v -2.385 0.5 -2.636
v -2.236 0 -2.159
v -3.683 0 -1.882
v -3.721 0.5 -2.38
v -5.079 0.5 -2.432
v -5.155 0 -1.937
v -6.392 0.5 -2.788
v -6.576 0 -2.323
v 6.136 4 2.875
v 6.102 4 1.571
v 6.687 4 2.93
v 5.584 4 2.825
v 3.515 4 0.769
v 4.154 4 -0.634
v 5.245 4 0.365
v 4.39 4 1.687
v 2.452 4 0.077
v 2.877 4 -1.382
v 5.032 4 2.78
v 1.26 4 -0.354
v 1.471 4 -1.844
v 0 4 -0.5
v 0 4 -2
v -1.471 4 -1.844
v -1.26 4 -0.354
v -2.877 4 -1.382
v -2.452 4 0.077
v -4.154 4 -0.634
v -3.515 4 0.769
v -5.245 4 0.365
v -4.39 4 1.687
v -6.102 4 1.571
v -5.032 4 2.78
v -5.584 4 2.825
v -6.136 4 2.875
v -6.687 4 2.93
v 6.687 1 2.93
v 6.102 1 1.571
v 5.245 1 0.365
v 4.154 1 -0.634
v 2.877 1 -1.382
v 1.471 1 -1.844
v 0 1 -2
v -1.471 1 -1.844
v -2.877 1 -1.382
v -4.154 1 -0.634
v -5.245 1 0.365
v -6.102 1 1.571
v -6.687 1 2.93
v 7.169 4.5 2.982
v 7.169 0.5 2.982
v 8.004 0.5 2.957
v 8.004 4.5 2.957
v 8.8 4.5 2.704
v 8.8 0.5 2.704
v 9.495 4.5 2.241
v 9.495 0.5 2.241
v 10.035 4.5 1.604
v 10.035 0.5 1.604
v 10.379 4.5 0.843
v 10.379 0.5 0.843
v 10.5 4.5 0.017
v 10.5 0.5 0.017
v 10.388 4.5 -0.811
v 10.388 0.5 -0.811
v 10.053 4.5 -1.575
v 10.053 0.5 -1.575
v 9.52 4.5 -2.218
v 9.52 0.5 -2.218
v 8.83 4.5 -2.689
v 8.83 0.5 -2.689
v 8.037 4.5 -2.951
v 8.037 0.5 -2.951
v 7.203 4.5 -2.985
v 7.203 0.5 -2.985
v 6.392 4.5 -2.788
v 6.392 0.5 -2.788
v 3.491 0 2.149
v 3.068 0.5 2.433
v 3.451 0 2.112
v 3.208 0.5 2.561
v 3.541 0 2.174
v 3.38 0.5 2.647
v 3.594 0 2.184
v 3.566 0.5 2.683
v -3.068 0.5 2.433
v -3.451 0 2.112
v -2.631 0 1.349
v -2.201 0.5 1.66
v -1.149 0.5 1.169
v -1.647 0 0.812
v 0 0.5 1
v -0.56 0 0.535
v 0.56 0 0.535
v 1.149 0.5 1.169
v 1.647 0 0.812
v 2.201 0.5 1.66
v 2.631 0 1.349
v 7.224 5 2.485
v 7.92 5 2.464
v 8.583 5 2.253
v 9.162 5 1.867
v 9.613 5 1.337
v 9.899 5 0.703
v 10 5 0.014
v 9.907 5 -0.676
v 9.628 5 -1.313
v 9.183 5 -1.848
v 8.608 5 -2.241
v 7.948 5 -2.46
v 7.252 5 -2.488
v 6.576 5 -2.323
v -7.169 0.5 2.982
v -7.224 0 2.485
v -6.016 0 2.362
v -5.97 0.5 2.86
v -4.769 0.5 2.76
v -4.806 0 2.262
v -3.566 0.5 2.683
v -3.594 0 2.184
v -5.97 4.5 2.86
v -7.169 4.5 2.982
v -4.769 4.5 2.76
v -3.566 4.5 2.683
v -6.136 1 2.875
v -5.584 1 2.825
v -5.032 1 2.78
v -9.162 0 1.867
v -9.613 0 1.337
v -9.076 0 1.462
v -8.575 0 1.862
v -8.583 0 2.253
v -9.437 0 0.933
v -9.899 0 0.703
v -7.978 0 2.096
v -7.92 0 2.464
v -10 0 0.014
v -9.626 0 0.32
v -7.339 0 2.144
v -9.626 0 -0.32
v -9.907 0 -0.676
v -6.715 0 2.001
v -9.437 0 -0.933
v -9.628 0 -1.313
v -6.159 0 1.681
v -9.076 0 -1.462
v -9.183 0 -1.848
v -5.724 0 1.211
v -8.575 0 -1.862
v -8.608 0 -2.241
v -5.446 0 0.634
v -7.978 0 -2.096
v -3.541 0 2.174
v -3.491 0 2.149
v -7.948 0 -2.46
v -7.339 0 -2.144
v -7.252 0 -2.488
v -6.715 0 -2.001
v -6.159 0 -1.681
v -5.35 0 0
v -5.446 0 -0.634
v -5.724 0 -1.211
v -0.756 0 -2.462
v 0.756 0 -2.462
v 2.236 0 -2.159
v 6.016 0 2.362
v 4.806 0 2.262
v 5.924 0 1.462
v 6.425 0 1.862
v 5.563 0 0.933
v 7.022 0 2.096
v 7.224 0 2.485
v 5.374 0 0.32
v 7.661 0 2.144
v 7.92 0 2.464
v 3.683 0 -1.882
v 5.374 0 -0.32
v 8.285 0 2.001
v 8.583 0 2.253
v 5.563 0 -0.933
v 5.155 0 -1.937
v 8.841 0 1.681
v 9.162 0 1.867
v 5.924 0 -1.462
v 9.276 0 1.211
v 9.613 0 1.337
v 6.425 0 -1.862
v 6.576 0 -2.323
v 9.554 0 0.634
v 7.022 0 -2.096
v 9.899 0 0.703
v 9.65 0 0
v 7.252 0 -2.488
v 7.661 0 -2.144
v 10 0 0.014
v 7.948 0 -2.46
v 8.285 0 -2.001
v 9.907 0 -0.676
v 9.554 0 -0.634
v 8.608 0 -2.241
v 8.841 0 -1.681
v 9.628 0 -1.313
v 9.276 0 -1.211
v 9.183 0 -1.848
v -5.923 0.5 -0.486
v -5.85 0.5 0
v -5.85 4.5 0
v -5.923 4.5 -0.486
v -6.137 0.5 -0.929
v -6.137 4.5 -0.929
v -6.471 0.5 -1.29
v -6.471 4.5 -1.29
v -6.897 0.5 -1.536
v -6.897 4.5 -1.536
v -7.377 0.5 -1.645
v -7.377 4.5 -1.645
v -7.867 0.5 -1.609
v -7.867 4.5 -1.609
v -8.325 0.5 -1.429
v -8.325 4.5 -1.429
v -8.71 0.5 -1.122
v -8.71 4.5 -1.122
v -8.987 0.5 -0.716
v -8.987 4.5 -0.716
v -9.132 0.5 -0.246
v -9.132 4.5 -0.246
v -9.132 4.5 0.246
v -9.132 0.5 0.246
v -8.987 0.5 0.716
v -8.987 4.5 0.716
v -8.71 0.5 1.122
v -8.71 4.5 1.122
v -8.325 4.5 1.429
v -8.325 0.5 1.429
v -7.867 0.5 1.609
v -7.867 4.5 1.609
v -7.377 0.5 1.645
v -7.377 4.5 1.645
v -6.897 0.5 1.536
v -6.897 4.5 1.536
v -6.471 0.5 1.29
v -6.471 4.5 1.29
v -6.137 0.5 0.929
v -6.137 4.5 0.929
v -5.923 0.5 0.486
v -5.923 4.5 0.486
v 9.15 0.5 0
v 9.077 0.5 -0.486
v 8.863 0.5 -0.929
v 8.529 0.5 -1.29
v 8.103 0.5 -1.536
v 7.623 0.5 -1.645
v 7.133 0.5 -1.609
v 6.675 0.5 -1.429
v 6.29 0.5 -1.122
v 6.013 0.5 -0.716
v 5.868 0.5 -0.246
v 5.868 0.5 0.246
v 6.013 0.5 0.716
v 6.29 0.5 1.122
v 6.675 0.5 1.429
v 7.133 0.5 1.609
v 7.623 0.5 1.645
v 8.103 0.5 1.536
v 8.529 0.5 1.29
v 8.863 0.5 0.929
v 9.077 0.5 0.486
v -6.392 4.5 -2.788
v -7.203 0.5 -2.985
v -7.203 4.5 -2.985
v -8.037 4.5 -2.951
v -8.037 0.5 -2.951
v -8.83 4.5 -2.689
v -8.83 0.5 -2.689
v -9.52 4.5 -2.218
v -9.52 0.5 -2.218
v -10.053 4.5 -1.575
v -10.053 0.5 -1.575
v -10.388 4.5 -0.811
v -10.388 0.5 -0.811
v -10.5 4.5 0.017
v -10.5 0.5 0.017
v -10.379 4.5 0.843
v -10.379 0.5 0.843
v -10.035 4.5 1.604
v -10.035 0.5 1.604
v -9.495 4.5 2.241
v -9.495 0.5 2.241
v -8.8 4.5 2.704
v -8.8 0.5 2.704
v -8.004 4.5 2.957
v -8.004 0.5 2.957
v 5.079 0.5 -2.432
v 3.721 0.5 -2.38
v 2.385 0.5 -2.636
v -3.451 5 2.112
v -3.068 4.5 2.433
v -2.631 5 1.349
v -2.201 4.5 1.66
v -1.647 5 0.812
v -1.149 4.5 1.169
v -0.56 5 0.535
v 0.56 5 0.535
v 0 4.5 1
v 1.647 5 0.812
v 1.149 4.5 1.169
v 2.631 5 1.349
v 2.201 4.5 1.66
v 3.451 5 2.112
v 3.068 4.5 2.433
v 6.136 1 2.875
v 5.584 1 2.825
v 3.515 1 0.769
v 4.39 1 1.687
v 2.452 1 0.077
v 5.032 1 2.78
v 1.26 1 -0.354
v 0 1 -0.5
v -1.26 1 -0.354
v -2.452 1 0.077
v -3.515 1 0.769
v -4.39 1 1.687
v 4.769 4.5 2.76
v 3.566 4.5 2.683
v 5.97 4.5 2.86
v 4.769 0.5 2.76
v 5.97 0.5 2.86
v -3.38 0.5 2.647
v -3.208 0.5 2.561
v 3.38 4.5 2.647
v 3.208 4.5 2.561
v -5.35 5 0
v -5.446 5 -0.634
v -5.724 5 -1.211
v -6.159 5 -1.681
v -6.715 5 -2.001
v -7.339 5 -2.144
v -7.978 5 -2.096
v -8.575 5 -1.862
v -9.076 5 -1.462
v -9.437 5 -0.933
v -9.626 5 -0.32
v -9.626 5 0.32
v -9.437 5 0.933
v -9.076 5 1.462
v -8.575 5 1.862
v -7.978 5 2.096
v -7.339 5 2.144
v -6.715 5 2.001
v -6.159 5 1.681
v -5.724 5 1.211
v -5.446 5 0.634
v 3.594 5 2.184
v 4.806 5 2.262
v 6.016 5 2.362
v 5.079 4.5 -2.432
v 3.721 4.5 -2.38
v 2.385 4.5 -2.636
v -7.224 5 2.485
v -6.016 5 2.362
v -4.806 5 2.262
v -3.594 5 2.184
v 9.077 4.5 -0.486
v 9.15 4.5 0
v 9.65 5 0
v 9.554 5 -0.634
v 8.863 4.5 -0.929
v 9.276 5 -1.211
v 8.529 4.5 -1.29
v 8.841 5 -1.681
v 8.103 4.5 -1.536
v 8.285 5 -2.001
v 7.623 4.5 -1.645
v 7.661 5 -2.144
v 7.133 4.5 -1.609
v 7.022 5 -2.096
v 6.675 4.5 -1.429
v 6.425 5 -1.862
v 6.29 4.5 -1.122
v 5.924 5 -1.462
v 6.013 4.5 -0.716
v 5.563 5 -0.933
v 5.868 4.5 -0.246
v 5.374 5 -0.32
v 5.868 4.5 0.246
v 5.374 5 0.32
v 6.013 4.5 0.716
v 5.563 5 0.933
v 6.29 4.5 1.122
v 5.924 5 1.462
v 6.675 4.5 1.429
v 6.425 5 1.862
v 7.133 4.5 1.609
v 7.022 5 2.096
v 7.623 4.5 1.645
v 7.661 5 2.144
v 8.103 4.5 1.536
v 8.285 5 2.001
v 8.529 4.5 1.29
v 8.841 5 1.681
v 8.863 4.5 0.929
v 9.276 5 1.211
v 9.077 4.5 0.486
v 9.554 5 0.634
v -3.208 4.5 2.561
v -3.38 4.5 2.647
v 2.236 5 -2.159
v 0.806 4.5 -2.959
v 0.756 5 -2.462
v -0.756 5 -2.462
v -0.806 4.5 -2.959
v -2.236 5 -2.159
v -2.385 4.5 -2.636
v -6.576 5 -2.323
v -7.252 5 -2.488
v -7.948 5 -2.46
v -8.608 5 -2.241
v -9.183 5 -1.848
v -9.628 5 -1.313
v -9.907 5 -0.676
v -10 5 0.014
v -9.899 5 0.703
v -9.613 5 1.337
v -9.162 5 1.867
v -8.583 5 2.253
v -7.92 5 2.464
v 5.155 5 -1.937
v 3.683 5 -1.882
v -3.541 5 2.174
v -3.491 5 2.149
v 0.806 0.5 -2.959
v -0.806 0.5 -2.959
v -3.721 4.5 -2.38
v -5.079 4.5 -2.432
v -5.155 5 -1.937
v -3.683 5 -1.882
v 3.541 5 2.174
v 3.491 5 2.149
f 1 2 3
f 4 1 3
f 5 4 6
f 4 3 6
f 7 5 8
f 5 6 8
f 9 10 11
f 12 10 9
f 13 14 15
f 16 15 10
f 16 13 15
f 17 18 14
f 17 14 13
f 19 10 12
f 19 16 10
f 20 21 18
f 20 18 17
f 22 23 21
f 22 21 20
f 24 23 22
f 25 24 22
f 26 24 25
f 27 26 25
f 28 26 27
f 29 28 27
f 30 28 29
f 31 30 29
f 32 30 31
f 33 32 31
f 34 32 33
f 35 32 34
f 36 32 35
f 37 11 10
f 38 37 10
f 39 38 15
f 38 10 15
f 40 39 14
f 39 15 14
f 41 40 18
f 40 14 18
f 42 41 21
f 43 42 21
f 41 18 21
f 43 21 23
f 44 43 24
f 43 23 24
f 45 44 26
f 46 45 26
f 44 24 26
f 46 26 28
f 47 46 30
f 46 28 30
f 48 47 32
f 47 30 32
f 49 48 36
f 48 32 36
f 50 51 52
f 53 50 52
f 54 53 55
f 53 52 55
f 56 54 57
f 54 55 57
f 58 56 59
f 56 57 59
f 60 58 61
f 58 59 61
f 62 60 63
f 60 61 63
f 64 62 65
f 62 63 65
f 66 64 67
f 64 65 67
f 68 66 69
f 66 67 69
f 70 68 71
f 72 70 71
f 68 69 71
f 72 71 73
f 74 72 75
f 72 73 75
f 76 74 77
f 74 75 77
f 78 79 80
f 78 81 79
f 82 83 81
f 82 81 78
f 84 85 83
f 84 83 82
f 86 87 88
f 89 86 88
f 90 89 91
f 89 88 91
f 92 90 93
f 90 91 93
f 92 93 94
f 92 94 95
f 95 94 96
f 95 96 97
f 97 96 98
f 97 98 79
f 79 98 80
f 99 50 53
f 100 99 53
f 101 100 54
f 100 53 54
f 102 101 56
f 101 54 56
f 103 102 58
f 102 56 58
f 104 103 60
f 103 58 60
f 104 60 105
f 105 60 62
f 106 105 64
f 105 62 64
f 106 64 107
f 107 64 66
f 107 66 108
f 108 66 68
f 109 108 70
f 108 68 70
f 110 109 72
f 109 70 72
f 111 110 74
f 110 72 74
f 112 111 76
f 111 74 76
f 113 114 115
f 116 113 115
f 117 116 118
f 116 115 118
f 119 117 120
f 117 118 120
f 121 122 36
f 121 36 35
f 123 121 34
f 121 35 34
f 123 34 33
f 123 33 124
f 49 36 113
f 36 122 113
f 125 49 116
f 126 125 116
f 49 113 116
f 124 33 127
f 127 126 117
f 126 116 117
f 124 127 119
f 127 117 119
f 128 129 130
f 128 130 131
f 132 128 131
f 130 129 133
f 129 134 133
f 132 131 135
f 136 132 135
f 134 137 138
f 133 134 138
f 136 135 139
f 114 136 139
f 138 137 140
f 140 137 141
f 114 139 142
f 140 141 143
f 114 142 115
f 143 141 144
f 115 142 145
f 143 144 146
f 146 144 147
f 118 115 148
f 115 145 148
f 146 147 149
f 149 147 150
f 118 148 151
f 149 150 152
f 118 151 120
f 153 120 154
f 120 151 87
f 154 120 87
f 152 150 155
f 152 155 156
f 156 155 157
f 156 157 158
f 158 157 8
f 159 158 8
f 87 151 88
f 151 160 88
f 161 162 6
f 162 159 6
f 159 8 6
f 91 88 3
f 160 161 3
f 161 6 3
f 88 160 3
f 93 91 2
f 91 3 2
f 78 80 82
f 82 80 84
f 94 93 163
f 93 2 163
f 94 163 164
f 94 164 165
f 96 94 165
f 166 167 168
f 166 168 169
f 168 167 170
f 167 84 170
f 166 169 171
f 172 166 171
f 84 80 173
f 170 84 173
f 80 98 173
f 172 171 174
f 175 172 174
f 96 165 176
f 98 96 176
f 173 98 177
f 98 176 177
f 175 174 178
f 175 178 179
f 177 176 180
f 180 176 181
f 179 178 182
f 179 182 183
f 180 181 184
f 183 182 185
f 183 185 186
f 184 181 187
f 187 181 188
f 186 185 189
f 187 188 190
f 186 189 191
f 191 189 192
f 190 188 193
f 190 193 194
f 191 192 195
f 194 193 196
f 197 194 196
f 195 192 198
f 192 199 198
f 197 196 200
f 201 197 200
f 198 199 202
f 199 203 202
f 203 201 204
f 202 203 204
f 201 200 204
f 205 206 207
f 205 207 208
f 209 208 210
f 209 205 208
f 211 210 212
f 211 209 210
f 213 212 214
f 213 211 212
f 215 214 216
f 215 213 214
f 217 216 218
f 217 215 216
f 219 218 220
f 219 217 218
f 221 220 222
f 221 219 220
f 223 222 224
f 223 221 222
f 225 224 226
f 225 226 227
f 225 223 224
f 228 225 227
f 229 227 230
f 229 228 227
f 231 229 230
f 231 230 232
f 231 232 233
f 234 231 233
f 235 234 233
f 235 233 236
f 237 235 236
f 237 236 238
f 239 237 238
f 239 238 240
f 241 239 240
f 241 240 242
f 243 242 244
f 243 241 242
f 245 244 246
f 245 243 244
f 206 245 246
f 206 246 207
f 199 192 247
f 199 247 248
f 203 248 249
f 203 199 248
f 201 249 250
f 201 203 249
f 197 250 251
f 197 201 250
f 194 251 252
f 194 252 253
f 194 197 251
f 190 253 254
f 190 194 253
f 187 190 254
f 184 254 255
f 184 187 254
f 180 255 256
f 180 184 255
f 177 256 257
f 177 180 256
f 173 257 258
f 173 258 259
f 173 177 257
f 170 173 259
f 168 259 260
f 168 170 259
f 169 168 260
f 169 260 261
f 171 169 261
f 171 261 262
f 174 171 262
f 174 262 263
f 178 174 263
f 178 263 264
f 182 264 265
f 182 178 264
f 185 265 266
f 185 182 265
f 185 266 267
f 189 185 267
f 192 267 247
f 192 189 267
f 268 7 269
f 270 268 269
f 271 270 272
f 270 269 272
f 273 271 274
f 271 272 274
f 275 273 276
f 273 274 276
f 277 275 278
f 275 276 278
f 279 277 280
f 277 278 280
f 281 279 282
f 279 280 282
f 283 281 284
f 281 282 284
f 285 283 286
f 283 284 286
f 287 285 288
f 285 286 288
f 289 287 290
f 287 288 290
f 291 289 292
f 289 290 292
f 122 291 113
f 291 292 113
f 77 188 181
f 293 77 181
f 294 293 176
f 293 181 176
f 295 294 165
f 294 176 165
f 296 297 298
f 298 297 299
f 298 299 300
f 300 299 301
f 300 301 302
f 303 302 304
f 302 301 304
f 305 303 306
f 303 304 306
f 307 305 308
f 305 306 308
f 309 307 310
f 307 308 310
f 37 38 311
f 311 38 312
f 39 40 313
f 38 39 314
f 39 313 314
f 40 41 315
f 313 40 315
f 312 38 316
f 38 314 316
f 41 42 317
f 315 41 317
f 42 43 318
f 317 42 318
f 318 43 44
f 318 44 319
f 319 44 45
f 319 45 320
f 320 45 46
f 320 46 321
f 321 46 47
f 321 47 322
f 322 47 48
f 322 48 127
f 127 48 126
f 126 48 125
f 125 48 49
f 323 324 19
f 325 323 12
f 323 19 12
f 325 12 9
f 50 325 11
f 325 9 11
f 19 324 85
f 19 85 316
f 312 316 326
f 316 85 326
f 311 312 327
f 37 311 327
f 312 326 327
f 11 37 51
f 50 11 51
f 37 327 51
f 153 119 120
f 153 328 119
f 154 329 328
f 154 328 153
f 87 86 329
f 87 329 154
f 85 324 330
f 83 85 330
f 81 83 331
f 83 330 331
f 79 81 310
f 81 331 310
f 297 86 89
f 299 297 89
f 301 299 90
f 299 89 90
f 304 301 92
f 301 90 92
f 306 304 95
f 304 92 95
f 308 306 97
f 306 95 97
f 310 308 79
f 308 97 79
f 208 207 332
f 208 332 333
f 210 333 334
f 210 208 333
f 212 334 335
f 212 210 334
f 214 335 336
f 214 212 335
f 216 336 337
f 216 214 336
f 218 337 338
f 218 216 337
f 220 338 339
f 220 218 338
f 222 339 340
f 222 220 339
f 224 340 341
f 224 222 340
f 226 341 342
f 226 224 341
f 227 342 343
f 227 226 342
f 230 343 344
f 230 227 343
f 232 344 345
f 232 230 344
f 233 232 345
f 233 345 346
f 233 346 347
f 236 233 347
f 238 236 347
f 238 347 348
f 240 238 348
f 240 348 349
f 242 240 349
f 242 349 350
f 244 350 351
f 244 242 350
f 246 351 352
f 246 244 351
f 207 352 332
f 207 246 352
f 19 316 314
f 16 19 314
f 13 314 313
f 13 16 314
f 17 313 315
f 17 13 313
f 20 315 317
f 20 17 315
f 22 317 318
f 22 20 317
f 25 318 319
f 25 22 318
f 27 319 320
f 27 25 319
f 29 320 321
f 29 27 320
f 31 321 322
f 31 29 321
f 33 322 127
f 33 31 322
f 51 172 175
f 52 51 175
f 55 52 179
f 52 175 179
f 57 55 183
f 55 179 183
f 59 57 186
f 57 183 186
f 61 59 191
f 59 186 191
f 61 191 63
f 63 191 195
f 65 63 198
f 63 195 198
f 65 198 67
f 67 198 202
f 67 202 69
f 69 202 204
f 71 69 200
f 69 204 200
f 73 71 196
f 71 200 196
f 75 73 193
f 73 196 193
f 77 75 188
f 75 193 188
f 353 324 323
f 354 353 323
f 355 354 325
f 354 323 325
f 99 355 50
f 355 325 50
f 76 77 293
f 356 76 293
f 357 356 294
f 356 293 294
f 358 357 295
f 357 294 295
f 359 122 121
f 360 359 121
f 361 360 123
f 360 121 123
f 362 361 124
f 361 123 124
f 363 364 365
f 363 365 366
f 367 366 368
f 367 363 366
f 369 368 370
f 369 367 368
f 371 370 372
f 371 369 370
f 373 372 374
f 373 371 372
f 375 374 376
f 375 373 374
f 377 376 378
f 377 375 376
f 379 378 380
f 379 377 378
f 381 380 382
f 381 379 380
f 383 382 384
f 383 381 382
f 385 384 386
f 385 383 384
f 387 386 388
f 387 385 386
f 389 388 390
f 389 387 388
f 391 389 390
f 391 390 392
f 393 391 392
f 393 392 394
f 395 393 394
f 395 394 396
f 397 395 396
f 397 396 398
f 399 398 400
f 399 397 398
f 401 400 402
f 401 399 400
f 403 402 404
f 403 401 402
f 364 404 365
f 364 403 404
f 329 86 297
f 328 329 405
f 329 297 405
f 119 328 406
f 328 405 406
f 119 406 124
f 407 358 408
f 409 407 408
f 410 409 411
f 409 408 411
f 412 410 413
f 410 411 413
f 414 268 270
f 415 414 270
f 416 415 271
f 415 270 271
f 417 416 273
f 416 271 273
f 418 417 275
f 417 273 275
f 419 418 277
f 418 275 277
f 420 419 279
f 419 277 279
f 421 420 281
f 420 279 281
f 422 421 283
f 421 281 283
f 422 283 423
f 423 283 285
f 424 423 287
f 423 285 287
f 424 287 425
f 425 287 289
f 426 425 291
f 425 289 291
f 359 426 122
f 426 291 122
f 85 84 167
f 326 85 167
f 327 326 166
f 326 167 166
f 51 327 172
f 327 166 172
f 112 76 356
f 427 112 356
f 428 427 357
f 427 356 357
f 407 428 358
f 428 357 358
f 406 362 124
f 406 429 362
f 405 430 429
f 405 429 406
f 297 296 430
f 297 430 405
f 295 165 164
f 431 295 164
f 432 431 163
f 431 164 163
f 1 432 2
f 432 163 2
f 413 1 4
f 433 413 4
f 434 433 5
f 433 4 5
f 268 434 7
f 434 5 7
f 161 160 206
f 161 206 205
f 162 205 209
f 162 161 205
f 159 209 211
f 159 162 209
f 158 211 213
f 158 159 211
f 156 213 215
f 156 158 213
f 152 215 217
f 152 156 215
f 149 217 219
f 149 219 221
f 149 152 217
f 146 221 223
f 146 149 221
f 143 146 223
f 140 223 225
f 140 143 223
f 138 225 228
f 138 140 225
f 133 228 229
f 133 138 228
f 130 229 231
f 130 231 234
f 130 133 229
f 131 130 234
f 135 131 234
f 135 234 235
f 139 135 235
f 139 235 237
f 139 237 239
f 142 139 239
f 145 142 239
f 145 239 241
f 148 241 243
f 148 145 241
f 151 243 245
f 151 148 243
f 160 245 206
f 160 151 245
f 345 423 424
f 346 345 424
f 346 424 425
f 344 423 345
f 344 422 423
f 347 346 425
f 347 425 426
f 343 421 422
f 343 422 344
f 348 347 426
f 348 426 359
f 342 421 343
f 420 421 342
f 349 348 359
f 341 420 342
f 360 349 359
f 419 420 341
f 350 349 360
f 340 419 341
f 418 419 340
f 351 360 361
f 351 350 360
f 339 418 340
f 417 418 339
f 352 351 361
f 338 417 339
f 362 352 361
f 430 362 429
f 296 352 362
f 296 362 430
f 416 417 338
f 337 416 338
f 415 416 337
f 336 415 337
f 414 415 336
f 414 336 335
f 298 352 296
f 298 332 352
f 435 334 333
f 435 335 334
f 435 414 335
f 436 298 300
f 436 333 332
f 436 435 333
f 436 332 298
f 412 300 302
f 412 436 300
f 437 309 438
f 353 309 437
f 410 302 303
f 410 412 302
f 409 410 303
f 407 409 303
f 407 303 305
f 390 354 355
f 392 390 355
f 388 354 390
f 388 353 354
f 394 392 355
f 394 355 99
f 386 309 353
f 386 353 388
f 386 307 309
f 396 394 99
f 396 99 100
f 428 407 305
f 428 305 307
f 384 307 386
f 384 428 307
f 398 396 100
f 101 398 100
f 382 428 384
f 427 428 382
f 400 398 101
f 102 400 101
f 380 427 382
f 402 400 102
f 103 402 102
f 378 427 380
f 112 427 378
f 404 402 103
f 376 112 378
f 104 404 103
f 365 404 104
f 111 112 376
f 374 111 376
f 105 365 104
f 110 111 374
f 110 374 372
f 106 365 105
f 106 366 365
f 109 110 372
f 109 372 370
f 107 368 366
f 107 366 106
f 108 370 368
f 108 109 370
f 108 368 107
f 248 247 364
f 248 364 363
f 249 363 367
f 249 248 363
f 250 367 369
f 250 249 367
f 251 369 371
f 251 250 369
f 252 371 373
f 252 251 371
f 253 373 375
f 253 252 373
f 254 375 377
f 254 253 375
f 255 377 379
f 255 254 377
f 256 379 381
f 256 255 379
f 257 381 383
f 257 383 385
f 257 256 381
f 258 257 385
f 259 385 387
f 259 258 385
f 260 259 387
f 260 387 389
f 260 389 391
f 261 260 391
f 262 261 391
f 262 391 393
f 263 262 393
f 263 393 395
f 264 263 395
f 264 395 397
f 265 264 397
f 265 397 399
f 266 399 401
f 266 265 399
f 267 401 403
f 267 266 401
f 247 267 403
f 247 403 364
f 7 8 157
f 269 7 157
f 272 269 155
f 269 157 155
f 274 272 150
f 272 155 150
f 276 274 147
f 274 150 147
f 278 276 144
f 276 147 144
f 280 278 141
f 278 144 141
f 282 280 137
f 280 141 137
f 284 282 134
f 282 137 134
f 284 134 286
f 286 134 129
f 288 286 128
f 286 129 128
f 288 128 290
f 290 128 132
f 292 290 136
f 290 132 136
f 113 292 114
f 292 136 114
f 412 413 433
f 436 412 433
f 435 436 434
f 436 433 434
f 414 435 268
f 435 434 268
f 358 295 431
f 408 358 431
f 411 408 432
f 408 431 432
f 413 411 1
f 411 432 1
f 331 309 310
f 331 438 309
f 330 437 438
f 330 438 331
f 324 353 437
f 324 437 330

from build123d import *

# Parameters (mm, degrees)
SKETCH1_R           = 1.65
BOSS_EXTRUDE1_DEPTH = 5
SKETCH2_W           = 1.5
SKETCH2_H           = 3
FILLET1_R           = 0.7
CHAMFER1_SIZE       = 0.5


with BuildPart() as part:
    # Sketch1 → Boss-Extrude1 (new body)
    with BuildSketch(Plane(origin=(0, 0, 0), x_dir=(1, 0, 0), z_dir=(0, 1, 0))):
        with BuildLine():
            ThreePointArc((-6.391530464, 2.787704304), (-10.473118103, 0.400710302), (-7.169117647, -2.981696978))
            ThreePointArc((-7.169117647, -2.981696978), (-5.211302896, -2.794373502), (-3.248717022, -2.666368129))
            ThreePointArc((-3.248717022, -2.666368129), (0, -1), (3.248717022, -2.666368129))
            ThreePointArc((3.248717022, -2.666368129), (5.211302896, -2.794373502), (7.169117647, -2.981696978))
            ThreePointArc((7.169117647, -2.981696978), (10.473118103, 0.400710302), (6.391530464, 2.787704304))
            ThreePointArc((6.391530464, 2.787704304), (4.401545037, 2.367406779), (2.385480795, 2.636064521))
            ThreePointArc((2.385480795, 2.636064521), (0, 3), (-2.385480795, 2.636064521))
            ThreePointArc((-2.385480795, 2.636064521), (-4.401545037, 2.367406779), (-6.391530464, 2.787704304))
        make_face()
        with Locations((-7.5, 0)):
            Circle(SKETCH1_R, mode=Mode.SUBTRACT)
        with Locations((7.5, 0)):
            Circle(SKETCH1_R, mode=Mode.SUBTRACT)
    extrude(amount=BOSS_EXTRUDE1_DEPTH)

    # Sketch2 → Cut-Revolve1 (revolve, cut)
    with BuildSketch(Plane(origin=(0, 0, 0), x_dir=(0, 0, -1), z_dir=(1, 0, 0))):
        with Locations((1.25, 2.5)):
            Rectangle(SKETCH2_W, SKETCH2_H)
    revolve(axis=Axis((0, 0, 5), (0, 1, 0)), mode=Mode.SUBTRACT)

    # Fillet1
    fillet1_edges = [part.edges().sort_by_distance(p)[0] for p in [
        (3.248717022, 2.5, 2.666368129),
        (-3.248717022, 2.5, 2.666368129),
    ]]
    fillet(fillet1_edges, radius=FILLET1_R)

    # Chamfer1
    chamfer1_edges = [part.edges().sort_by_distance(p)[0] for p in [
        (-4.401545037, 0, -2.367406779),
        (0, 0, -3),
        (-9.15, 5, 0),
        (4.401545037, 0, -2.367406779),
        (10.473118103, 0, -0.400710302),
        (-5.369814622, 0, 2.80731824),
        (-10.473118103, 0, -0.400710302),
        (-9.15, 0, 0),
        (5.85, 0, 0),
        (-10.473118103, 5, -0.400710302),
        (-5.369814622, 5, 2.80731824),
        (10.473118103, 5, -0.400710302),
        (4.401545037, 5, -2.367406779),
        (5.369814622, 0, 2.80731824),
        (0, 5, -3),
        (5.369814622, 5, 2.80731824),
        (0, 0, 1),
        (-3.29118131, 0, 2.609929037),
        (3.29118131, 0, 2.609929037),
        (0, 5, 1),
        (-4.401545037, 5, -2.367406779),
        (-3.29118131, 5, 2.609929037),
        (3.29118131, 5, 2.609929037),
        (5.85, 5, 0),
    ]]
    chamfer(chamfer1_edges, length=CHAMFER1_SIZE)


solid = part.part
